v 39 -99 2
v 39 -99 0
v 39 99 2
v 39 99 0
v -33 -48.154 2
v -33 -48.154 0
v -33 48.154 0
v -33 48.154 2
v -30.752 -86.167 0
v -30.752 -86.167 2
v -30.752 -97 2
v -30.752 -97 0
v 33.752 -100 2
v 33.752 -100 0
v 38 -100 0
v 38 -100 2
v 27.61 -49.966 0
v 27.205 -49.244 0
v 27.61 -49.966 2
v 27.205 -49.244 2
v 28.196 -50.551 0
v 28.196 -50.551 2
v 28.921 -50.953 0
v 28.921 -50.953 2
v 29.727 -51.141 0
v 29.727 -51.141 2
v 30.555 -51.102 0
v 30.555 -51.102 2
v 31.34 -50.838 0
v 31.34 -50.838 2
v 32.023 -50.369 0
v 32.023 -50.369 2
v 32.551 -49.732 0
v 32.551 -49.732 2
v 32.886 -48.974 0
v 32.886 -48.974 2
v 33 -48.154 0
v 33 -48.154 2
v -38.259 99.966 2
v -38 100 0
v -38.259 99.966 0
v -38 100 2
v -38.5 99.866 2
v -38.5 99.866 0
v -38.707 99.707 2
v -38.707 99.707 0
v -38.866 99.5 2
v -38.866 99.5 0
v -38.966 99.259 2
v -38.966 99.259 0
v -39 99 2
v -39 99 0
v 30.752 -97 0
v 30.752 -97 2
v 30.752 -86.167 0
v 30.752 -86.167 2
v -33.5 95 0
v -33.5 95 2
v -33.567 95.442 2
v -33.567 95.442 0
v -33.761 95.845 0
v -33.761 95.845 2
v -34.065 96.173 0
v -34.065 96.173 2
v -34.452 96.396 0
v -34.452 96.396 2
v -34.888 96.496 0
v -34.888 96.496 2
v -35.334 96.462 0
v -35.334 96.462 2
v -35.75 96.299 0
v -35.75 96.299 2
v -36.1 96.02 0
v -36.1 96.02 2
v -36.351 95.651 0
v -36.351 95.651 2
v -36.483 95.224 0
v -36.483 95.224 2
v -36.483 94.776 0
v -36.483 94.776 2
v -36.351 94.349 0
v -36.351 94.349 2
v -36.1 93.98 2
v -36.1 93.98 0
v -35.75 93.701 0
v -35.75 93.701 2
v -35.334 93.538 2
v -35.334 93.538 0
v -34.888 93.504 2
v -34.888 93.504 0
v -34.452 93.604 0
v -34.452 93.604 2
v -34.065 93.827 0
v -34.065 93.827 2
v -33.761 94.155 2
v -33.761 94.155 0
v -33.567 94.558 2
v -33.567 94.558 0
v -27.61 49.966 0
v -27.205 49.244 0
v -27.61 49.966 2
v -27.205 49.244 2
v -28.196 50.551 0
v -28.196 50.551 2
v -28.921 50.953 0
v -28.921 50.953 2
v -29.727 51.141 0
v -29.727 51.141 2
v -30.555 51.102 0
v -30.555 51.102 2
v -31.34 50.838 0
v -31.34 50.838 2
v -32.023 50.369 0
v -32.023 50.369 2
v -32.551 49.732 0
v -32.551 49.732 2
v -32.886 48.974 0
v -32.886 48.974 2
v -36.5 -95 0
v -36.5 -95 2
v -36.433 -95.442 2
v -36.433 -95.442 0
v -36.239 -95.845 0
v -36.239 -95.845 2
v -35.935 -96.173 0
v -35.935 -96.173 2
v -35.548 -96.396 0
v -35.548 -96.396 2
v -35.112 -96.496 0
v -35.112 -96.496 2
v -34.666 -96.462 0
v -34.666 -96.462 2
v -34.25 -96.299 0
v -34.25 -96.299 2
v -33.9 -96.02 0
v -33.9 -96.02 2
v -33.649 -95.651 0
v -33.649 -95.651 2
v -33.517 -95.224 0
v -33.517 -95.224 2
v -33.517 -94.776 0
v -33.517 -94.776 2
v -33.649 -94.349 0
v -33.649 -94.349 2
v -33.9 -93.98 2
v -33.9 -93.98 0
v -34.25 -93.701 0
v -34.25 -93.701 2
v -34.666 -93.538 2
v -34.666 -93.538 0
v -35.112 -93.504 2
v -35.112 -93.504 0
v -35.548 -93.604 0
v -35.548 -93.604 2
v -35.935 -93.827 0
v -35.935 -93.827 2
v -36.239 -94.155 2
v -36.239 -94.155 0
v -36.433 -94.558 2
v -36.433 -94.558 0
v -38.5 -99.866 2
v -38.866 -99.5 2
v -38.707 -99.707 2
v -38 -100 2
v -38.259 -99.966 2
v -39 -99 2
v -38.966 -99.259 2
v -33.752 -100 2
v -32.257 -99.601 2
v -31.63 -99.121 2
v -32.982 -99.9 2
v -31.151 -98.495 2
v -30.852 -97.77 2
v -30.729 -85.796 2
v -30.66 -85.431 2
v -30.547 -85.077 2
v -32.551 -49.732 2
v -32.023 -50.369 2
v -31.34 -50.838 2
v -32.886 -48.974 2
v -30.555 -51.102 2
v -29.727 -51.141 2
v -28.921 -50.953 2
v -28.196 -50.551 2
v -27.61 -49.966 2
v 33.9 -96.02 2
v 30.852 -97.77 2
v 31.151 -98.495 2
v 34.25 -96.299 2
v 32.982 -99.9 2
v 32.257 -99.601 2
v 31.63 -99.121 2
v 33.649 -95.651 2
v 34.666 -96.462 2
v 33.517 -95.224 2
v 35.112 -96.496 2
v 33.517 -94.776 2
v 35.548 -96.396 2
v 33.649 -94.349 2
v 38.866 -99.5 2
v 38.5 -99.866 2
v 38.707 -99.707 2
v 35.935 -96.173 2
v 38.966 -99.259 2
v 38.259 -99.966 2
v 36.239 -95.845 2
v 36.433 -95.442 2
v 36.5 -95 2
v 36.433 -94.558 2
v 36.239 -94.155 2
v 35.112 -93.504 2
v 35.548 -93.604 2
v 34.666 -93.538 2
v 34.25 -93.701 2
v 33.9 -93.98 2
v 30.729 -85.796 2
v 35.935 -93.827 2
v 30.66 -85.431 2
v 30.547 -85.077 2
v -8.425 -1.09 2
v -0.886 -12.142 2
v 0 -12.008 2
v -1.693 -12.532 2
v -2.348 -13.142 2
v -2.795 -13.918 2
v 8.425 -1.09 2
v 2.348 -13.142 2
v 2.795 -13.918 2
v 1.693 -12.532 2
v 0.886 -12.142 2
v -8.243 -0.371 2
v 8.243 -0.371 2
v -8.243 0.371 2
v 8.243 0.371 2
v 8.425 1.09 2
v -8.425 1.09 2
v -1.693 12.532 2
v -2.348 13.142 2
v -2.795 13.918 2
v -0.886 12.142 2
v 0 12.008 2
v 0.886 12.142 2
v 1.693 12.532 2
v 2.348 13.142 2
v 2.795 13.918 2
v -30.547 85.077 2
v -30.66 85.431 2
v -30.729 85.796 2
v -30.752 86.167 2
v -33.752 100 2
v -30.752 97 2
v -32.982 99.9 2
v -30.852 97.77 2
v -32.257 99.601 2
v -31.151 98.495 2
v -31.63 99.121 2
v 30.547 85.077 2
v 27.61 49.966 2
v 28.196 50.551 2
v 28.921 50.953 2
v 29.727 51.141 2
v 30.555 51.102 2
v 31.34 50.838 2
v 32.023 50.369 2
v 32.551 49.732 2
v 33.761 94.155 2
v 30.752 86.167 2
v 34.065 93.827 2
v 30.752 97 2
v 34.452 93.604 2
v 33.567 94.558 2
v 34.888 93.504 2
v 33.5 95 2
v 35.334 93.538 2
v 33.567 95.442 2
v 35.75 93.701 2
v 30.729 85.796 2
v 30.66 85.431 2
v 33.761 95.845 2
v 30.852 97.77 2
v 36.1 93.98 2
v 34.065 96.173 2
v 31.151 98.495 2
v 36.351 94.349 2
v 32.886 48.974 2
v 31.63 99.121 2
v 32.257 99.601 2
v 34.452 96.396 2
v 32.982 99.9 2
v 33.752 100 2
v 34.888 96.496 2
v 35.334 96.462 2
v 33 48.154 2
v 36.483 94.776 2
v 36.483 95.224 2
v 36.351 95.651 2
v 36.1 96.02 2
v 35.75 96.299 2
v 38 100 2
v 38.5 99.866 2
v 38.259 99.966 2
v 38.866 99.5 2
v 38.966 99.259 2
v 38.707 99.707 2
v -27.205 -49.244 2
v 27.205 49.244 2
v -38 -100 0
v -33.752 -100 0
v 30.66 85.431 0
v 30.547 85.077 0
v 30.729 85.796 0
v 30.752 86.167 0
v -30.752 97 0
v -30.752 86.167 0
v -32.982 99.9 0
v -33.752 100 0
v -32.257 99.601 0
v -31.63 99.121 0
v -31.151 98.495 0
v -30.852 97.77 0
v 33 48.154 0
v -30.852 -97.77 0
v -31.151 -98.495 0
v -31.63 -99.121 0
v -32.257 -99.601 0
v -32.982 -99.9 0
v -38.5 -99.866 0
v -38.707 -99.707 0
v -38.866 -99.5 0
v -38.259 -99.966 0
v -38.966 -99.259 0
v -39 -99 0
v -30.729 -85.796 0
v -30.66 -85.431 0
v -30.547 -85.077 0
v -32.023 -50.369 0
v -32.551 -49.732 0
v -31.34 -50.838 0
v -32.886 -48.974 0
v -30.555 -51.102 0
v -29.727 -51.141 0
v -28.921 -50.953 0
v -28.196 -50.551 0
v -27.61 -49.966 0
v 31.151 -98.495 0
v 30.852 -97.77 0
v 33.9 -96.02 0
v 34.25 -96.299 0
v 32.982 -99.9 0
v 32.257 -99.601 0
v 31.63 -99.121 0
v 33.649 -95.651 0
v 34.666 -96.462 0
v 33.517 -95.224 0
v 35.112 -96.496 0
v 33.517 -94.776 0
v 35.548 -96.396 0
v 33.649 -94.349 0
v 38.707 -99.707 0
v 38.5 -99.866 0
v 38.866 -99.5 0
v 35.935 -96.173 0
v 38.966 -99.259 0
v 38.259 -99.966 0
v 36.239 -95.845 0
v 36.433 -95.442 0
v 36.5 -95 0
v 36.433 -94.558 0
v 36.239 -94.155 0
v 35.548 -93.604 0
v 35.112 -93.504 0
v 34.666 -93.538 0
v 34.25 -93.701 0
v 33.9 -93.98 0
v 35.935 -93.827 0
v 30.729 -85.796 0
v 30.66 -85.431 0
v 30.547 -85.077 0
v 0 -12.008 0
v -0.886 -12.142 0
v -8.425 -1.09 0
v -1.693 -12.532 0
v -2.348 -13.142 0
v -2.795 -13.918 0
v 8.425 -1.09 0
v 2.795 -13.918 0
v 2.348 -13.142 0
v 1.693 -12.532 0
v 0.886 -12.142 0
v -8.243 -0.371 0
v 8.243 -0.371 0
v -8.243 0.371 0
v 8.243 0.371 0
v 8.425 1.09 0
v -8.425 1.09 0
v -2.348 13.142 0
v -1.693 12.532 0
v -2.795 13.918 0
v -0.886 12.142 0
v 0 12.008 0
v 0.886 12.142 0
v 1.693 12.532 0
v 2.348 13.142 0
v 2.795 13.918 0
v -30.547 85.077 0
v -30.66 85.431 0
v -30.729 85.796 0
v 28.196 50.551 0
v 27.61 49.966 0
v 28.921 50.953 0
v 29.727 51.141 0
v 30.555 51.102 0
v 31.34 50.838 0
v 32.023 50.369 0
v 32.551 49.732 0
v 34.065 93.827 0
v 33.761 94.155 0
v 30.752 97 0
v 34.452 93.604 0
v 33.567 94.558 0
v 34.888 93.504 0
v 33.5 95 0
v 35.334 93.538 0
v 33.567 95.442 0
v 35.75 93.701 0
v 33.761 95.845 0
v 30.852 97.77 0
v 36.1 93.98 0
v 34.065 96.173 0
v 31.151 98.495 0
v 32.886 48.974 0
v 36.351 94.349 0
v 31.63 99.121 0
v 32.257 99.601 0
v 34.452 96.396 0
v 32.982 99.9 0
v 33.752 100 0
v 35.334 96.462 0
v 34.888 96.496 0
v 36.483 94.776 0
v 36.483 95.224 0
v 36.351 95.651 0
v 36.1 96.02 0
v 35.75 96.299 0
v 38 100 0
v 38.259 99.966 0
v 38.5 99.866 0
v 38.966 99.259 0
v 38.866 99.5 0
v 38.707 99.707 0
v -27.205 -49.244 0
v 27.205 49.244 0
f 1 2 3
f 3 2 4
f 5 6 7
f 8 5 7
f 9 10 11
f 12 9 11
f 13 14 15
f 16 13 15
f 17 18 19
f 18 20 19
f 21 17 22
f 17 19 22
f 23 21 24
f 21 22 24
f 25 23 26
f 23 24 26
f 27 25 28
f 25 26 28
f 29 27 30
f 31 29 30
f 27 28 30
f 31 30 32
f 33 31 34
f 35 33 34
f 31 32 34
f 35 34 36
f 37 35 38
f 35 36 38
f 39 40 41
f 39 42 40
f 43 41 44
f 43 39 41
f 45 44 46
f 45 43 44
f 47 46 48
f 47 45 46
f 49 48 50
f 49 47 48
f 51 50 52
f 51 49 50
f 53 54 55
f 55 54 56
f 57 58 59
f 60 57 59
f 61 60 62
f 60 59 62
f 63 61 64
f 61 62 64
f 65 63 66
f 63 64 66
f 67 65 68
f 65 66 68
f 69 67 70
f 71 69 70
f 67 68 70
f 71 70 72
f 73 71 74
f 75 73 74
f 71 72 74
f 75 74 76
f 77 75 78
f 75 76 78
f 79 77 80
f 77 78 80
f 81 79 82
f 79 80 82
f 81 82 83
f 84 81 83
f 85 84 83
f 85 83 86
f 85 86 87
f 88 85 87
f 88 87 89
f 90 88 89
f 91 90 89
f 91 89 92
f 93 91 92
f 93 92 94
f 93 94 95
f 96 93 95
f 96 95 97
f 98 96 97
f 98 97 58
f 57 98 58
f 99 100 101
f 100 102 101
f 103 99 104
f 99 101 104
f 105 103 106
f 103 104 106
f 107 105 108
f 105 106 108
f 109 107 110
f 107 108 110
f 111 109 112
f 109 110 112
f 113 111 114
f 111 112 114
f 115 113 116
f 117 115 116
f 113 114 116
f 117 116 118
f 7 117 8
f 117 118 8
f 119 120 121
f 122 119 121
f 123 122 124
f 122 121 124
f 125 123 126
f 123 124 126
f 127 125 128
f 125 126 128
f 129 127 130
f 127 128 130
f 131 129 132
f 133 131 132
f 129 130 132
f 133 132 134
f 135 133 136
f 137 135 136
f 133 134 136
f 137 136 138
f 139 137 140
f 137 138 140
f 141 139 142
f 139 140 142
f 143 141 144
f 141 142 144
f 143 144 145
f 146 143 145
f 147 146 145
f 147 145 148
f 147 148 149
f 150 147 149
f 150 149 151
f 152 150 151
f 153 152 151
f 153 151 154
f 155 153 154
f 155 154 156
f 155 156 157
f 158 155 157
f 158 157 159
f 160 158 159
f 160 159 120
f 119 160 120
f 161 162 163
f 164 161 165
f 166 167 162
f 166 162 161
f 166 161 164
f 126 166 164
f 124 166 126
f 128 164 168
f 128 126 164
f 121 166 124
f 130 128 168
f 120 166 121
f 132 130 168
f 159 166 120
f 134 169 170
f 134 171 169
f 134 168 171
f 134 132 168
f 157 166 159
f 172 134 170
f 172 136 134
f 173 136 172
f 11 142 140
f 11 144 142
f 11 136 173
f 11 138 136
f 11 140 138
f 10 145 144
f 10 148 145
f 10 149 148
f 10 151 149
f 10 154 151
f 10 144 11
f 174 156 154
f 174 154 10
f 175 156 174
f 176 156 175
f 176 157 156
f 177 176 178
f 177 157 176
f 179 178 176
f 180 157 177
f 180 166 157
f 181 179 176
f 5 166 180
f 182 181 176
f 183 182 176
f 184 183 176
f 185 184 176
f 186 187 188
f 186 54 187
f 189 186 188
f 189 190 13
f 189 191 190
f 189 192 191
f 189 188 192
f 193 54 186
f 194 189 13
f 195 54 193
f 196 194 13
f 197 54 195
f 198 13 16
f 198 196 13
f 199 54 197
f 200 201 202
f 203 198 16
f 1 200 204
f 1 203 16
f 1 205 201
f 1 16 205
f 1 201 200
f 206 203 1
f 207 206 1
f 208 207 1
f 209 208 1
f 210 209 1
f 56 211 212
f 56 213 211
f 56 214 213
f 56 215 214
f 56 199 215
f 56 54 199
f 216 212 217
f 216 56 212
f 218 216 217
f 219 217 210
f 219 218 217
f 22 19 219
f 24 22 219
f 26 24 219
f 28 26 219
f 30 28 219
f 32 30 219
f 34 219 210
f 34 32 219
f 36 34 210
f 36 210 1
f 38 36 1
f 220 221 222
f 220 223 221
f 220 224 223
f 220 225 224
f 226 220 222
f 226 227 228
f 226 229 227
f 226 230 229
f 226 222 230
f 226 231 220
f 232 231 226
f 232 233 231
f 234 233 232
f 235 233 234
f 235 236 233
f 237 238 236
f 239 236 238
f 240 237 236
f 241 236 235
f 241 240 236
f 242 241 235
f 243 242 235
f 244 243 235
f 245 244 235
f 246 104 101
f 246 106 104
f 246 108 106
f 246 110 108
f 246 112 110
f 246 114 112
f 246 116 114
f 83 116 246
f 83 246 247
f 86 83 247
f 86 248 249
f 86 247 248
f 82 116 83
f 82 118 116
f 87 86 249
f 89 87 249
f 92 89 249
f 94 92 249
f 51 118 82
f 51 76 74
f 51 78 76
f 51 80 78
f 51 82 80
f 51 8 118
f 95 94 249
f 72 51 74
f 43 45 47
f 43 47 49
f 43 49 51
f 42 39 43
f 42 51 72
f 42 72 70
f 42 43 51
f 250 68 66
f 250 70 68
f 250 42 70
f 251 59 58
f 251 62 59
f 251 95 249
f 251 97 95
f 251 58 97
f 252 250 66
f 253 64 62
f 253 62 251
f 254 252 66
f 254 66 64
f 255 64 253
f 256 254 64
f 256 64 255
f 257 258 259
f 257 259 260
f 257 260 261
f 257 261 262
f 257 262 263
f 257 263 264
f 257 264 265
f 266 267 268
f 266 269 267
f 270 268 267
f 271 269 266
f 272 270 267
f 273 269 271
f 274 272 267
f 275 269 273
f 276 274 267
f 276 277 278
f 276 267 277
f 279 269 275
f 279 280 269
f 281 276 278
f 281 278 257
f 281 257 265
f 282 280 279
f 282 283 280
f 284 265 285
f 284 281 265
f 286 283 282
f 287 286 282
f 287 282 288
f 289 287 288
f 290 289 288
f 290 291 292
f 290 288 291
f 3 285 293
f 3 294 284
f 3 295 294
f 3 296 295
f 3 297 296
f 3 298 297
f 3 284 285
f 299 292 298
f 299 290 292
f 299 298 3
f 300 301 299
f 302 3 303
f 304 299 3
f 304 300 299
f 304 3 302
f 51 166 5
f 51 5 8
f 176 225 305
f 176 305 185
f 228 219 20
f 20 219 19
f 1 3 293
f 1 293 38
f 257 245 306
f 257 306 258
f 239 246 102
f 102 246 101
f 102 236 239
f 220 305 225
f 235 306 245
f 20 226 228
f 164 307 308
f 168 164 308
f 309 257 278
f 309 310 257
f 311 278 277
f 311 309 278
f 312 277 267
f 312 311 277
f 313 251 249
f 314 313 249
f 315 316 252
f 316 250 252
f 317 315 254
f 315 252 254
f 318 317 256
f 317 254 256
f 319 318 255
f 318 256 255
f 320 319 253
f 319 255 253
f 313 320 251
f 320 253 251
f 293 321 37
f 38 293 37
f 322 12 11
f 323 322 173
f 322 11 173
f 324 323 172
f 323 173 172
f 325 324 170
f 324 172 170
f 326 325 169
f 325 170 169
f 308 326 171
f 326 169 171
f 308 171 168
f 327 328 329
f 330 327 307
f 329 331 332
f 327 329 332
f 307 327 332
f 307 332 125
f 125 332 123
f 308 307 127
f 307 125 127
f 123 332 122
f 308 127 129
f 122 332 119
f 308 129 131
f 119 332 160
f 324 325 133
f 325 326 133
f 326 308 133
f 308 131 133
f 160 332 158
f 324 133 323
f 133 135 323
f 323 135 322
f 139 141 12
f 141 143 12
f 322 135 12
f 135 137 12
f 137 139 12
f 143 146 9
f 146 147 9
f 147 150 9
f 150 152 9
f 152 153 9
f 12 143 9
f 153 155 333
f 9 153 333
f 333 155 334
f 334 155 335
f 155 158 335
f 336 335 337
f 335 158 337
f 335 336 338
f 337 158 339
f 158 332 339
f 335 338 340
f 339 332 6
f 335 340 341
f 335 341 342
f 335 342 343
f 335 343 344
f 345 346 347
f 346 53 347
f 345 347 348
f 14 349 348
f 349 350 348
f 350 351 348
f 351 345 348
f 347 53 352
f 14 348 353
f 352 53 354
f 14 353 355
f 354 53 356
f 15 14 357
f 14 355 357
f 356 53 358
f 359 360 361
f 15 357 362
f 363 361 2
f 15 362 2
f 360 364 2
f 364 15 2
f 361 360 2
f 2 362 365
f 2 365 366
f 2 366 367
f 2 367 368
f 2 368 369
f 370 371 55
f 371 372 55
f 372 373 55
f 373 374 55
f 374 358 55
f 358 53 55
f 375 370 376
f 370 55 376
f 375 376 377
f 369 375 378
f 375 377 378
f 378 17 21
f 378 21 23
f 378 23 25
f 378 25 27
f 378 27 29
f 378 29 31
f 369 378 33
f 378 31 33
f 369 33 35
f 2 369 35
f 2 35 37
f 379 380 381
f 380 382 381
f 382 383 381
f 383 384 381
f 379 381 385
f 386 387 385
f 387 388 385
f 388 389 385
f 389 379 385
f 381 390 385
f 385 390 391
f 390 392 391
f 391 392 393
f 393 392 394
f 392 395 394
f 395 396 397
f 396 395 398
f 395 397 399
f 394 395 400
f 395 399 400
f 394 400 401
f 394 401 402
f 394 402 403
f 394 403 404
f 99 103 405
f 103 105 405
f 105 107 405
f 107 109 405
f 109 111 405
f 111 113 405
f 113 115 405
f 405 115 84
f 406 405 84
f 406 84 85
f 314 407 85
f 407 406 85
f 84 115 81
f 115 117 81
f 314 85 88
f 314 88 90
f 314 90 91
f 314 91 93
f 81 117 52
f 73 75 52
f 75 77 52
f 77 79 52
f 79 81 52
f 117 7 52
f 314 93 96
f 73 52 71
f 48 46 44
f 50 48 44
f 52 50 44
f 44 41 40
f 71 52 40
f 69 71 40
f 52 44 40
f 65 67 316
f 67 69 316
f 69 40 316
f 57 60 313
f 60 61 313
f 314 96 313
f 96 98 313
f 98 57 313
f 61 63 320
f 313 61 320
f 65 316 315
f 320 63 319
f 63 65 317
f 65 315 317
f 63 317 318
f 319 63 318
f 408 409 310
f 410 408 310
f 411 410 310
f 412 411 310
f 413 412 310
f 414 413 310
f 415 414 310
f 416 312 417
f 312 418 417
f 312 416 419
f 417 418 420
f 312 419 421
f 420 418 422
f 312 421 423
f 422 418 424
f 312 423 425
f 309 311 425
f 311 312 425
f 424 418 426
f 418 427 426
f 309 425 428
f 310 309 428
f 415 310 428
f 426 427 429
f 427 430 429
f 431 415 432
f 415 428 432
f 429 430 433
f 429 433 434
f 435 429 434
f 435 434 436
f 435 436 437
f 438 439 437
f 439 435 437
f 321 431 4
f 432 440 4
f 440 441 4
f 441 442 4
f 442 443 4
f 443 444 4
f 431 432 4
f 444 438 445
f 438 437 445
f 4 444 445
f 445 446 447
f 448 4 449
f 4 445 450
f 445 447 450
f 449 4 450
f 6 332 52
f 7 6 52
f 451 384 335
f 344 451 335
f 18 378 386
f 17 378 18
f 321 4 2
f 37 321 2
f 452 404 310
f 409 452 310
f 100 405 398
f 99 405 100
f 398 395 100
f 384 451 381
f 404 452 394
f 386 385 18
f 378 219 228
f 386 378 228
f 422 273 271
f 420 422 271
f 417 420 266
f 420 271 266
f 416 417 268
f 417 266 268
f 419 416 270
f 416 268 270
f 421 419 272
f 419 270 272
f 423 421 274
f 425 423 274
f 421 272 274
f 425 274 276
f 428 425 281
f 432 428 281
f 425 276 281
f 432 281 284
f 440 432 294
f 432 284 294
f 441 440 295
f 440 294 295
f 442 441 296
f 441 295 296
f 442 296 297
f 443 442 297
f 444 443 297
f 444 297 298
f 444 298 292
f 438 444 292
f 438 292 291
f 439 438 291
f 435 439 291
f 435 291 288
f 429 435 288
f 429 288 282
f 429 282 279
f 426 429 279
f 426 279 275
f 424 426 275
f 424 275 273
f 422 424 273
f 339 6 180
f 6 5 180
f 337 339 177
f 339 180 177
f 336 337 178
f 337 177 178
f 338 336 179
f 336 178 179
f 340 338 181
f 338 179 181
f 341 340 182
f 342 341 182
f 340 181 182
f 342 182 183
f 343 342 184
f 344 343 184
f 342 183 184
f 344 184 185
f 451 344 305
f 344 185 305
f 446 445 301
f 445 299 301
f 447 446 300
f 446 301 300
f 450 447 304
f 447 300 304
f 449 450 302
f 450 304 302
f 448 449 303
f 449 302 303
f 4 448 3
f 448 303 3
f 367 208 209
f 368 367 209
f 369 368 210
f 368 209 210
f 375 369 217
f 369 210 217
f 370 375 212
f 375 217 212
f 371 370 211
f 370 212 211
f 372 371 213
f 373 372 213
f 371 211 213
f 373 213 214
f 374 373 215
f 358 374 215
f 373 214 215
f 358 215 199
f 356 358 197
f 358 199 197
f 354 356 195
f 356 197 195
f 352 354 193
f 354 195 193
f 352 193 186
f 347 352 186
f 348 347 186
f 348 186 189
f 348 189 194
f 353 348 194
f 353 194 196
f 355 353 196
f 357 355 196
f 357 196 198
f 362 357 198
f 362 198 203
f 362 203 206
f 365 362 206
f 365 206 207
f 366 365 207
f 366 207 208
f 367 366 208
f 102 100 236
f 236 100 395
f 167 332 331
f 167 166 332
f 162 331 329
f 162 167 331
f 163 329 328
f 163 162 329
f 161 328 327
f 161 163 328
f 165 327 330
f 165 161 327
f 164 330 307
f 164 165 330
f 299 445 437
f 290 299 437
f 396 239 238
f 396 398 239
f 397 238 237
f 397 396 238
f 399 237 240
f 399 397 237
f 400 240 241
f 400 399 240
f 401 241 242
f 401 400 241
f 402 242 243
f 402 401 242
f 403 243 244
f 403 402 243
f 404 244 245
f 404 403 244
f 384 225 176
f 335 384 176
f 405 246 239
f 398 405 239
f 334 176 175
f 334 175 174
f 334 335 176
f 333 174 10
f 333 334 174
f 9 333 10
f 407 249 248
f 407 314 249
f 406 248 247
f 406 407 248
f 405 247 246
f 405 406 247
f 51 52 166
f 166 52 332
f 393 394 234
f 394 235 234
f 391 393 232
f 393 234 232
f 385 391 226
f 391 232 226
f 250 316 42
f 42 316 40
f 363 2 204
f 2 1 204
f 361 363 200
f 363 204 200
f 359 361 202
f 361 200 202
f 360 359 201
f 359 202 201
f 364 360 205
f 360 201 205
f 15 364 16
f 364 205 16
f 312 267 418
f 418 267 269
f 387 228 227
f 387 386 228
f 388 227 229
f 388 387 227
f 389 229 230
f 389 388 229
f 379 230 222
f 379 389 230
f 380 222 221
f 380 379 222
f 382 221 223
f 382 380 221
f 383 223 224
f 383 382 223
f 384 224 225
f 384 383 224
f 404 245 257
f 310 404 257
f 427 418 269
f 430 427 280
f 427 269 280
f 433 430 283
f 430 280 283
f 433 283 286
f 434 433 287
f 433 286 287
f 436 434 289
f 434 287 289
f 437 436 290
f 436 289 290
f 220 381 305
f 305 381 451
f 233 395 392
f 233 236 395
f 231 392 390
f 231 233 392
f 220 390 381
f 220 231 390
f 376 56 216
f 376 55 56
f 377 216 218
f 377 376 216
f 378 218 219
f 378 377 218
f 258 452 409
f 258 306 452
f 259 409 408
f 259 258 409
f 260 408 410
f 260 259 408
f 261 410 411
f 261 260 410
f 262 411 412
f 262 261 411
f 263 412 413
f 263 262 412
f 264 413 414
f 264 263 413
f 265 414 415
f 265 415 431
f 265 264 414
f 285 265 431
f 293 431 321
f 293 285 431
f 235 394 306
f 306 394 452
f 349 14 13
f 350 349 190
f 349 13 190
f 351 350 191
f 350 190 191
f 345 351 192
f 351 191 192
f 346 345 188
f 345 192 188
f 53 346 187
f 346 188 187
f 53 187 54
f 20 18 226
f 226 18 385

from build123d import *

# Parameters (mm, degrees)
EXTRUDE_1_DEPTH     = 2
SKETCH_4_R          = 1.5
CUT_EXTRUDE_3_DEPTH = 108.354552768
FILLET_4_R          = 1
CUT_EXTRUDE_5_DEPTH = 108.354552768
FILLET_7_R          = 3


with BuildPart() as part:
    # 草图1 → 凸台-拉伸1 (new body)
    with BuildSketch(Plane.XY):
        Polygon((39, 79.487179487), (33, 64.102564103), (33, -64.102564103), (39, -79.487179487), align=None)
        Polygon((33, -64.102564103), (8, 0), (0, -20.512820513), (31, -100), (39, -100), (39, -79.487179487), align=None)
        Polygon((-31, -100), (0, -20.512820513), (-8, 0), (-33, -64.102564103), (-39, -79.487179487), (-39, -100), align=None)
        Polygon((-33, -64.102564103), (-33, 64.102564103), (-39, 79.487179487), (-39, -79.487179487), align=None)
        Polygon((0, -20.512820513), (8, 0), (0, 20.512820513), (-8, 0), align=None)
        Polygon((8, 0), (33, 64.102564103), (39, 79.487179487), (39, 100), (31, 100), (0, 20.512820513), align=None)
        Polygon((-8, 0), (0, 20.512820513), (-31, 100), (-39, 100), (-39, 79.487179487), (-33, 64.102564103), align=None)
    extrude(amount=EXTRUDE_1_DEPTH)

    # 草图4 → 切除-拉伸3 (cut, through all)
    with BuildSketch(Plane.XY.offset(2)):
        with Locations((-35, 95)):
            Circle(SKETCH_4_R)
        with Locations(Location((-35, -95, 0), (0, 0, 180))):
            Circle(SKETCH_4_R)
        with Locations((35, -95)):
            Circle(SKETCH_4_R)
        with Locations(Location((35, 95, 0), (0, 0, 180))):
            Circle(SKETCH_4_R)
    extrude(amount=-CUT_EXTRUDE_3_DEPTH, mode=Mode.SUBTRACT)

    # 圆角4
    fillet_4_edges = [part.edges().sort_by_distance(p)[0] for p in [
        (39, -100, 1),
        (31, -100, 1),
        (-31, -100, 1),
        (-39, -100, 1),
        (-39, 100, 1),
        (-31, 100, 1),
        (31, 100, 1),
        (39, 100, 1),
    ]]
    fillet(fillet_4_edges, radius=FILLET_4_R)

    # 草图6 → 切除-拉伸5 (cut, through all)
    with BuildSketch(Plane.XY.offset(2)):
        Polygon((-30.751704658, -85.602329726), (-30.751704658, -99.363345276), (0, -20.512820513), (30.751704658, -99.363345276), (30.751704658, -85.602329726), (0, -6.751804962), align=None)
        Polygon((30.751704658, 85.602329726), (30.751704658, 99.363345276), (0, 20.512820513), (-30.751704658, 99.363345276), (-30.751704658, 85.602329726), (0, 6.751804962), align=None)
    extrude(amount=-CUT_EXTRUDE_5_DEPTH, mode=Mode.SUBTRACT)

    # 圆角7
    fillet_7_edges = [part.edges().sort_by_distance(p)[0] for p in [
        (30.751704658, 85.602329726, 1),
        (0, 6.751804962, 1),
        (-30.751704658, 85.602329726, 1),
        (-30.751704658, 99.363345276, 1),
        (-30.751704658, -99.363345276, 1),
        (0, -6.751804962, 1),
        (30.751704658, -85.602329726, 1),
        (30.751704658, -99.363345276, 1),
        (30.751704658, 99.363345276, 1),
        (33, 64.102564103, 1),
        (33, -64.102564103, 1),
        (8, 0, 1),
        (-8, 0, 1),
        (-33, -64.102564103, 1),
        (-33, 64.102564103, 1),
        (-30.751704658, -85.602329726, 1),
    ]]
    fillet(fillet_7_edges, radius=FILLET_7_R)


solid = part.part
